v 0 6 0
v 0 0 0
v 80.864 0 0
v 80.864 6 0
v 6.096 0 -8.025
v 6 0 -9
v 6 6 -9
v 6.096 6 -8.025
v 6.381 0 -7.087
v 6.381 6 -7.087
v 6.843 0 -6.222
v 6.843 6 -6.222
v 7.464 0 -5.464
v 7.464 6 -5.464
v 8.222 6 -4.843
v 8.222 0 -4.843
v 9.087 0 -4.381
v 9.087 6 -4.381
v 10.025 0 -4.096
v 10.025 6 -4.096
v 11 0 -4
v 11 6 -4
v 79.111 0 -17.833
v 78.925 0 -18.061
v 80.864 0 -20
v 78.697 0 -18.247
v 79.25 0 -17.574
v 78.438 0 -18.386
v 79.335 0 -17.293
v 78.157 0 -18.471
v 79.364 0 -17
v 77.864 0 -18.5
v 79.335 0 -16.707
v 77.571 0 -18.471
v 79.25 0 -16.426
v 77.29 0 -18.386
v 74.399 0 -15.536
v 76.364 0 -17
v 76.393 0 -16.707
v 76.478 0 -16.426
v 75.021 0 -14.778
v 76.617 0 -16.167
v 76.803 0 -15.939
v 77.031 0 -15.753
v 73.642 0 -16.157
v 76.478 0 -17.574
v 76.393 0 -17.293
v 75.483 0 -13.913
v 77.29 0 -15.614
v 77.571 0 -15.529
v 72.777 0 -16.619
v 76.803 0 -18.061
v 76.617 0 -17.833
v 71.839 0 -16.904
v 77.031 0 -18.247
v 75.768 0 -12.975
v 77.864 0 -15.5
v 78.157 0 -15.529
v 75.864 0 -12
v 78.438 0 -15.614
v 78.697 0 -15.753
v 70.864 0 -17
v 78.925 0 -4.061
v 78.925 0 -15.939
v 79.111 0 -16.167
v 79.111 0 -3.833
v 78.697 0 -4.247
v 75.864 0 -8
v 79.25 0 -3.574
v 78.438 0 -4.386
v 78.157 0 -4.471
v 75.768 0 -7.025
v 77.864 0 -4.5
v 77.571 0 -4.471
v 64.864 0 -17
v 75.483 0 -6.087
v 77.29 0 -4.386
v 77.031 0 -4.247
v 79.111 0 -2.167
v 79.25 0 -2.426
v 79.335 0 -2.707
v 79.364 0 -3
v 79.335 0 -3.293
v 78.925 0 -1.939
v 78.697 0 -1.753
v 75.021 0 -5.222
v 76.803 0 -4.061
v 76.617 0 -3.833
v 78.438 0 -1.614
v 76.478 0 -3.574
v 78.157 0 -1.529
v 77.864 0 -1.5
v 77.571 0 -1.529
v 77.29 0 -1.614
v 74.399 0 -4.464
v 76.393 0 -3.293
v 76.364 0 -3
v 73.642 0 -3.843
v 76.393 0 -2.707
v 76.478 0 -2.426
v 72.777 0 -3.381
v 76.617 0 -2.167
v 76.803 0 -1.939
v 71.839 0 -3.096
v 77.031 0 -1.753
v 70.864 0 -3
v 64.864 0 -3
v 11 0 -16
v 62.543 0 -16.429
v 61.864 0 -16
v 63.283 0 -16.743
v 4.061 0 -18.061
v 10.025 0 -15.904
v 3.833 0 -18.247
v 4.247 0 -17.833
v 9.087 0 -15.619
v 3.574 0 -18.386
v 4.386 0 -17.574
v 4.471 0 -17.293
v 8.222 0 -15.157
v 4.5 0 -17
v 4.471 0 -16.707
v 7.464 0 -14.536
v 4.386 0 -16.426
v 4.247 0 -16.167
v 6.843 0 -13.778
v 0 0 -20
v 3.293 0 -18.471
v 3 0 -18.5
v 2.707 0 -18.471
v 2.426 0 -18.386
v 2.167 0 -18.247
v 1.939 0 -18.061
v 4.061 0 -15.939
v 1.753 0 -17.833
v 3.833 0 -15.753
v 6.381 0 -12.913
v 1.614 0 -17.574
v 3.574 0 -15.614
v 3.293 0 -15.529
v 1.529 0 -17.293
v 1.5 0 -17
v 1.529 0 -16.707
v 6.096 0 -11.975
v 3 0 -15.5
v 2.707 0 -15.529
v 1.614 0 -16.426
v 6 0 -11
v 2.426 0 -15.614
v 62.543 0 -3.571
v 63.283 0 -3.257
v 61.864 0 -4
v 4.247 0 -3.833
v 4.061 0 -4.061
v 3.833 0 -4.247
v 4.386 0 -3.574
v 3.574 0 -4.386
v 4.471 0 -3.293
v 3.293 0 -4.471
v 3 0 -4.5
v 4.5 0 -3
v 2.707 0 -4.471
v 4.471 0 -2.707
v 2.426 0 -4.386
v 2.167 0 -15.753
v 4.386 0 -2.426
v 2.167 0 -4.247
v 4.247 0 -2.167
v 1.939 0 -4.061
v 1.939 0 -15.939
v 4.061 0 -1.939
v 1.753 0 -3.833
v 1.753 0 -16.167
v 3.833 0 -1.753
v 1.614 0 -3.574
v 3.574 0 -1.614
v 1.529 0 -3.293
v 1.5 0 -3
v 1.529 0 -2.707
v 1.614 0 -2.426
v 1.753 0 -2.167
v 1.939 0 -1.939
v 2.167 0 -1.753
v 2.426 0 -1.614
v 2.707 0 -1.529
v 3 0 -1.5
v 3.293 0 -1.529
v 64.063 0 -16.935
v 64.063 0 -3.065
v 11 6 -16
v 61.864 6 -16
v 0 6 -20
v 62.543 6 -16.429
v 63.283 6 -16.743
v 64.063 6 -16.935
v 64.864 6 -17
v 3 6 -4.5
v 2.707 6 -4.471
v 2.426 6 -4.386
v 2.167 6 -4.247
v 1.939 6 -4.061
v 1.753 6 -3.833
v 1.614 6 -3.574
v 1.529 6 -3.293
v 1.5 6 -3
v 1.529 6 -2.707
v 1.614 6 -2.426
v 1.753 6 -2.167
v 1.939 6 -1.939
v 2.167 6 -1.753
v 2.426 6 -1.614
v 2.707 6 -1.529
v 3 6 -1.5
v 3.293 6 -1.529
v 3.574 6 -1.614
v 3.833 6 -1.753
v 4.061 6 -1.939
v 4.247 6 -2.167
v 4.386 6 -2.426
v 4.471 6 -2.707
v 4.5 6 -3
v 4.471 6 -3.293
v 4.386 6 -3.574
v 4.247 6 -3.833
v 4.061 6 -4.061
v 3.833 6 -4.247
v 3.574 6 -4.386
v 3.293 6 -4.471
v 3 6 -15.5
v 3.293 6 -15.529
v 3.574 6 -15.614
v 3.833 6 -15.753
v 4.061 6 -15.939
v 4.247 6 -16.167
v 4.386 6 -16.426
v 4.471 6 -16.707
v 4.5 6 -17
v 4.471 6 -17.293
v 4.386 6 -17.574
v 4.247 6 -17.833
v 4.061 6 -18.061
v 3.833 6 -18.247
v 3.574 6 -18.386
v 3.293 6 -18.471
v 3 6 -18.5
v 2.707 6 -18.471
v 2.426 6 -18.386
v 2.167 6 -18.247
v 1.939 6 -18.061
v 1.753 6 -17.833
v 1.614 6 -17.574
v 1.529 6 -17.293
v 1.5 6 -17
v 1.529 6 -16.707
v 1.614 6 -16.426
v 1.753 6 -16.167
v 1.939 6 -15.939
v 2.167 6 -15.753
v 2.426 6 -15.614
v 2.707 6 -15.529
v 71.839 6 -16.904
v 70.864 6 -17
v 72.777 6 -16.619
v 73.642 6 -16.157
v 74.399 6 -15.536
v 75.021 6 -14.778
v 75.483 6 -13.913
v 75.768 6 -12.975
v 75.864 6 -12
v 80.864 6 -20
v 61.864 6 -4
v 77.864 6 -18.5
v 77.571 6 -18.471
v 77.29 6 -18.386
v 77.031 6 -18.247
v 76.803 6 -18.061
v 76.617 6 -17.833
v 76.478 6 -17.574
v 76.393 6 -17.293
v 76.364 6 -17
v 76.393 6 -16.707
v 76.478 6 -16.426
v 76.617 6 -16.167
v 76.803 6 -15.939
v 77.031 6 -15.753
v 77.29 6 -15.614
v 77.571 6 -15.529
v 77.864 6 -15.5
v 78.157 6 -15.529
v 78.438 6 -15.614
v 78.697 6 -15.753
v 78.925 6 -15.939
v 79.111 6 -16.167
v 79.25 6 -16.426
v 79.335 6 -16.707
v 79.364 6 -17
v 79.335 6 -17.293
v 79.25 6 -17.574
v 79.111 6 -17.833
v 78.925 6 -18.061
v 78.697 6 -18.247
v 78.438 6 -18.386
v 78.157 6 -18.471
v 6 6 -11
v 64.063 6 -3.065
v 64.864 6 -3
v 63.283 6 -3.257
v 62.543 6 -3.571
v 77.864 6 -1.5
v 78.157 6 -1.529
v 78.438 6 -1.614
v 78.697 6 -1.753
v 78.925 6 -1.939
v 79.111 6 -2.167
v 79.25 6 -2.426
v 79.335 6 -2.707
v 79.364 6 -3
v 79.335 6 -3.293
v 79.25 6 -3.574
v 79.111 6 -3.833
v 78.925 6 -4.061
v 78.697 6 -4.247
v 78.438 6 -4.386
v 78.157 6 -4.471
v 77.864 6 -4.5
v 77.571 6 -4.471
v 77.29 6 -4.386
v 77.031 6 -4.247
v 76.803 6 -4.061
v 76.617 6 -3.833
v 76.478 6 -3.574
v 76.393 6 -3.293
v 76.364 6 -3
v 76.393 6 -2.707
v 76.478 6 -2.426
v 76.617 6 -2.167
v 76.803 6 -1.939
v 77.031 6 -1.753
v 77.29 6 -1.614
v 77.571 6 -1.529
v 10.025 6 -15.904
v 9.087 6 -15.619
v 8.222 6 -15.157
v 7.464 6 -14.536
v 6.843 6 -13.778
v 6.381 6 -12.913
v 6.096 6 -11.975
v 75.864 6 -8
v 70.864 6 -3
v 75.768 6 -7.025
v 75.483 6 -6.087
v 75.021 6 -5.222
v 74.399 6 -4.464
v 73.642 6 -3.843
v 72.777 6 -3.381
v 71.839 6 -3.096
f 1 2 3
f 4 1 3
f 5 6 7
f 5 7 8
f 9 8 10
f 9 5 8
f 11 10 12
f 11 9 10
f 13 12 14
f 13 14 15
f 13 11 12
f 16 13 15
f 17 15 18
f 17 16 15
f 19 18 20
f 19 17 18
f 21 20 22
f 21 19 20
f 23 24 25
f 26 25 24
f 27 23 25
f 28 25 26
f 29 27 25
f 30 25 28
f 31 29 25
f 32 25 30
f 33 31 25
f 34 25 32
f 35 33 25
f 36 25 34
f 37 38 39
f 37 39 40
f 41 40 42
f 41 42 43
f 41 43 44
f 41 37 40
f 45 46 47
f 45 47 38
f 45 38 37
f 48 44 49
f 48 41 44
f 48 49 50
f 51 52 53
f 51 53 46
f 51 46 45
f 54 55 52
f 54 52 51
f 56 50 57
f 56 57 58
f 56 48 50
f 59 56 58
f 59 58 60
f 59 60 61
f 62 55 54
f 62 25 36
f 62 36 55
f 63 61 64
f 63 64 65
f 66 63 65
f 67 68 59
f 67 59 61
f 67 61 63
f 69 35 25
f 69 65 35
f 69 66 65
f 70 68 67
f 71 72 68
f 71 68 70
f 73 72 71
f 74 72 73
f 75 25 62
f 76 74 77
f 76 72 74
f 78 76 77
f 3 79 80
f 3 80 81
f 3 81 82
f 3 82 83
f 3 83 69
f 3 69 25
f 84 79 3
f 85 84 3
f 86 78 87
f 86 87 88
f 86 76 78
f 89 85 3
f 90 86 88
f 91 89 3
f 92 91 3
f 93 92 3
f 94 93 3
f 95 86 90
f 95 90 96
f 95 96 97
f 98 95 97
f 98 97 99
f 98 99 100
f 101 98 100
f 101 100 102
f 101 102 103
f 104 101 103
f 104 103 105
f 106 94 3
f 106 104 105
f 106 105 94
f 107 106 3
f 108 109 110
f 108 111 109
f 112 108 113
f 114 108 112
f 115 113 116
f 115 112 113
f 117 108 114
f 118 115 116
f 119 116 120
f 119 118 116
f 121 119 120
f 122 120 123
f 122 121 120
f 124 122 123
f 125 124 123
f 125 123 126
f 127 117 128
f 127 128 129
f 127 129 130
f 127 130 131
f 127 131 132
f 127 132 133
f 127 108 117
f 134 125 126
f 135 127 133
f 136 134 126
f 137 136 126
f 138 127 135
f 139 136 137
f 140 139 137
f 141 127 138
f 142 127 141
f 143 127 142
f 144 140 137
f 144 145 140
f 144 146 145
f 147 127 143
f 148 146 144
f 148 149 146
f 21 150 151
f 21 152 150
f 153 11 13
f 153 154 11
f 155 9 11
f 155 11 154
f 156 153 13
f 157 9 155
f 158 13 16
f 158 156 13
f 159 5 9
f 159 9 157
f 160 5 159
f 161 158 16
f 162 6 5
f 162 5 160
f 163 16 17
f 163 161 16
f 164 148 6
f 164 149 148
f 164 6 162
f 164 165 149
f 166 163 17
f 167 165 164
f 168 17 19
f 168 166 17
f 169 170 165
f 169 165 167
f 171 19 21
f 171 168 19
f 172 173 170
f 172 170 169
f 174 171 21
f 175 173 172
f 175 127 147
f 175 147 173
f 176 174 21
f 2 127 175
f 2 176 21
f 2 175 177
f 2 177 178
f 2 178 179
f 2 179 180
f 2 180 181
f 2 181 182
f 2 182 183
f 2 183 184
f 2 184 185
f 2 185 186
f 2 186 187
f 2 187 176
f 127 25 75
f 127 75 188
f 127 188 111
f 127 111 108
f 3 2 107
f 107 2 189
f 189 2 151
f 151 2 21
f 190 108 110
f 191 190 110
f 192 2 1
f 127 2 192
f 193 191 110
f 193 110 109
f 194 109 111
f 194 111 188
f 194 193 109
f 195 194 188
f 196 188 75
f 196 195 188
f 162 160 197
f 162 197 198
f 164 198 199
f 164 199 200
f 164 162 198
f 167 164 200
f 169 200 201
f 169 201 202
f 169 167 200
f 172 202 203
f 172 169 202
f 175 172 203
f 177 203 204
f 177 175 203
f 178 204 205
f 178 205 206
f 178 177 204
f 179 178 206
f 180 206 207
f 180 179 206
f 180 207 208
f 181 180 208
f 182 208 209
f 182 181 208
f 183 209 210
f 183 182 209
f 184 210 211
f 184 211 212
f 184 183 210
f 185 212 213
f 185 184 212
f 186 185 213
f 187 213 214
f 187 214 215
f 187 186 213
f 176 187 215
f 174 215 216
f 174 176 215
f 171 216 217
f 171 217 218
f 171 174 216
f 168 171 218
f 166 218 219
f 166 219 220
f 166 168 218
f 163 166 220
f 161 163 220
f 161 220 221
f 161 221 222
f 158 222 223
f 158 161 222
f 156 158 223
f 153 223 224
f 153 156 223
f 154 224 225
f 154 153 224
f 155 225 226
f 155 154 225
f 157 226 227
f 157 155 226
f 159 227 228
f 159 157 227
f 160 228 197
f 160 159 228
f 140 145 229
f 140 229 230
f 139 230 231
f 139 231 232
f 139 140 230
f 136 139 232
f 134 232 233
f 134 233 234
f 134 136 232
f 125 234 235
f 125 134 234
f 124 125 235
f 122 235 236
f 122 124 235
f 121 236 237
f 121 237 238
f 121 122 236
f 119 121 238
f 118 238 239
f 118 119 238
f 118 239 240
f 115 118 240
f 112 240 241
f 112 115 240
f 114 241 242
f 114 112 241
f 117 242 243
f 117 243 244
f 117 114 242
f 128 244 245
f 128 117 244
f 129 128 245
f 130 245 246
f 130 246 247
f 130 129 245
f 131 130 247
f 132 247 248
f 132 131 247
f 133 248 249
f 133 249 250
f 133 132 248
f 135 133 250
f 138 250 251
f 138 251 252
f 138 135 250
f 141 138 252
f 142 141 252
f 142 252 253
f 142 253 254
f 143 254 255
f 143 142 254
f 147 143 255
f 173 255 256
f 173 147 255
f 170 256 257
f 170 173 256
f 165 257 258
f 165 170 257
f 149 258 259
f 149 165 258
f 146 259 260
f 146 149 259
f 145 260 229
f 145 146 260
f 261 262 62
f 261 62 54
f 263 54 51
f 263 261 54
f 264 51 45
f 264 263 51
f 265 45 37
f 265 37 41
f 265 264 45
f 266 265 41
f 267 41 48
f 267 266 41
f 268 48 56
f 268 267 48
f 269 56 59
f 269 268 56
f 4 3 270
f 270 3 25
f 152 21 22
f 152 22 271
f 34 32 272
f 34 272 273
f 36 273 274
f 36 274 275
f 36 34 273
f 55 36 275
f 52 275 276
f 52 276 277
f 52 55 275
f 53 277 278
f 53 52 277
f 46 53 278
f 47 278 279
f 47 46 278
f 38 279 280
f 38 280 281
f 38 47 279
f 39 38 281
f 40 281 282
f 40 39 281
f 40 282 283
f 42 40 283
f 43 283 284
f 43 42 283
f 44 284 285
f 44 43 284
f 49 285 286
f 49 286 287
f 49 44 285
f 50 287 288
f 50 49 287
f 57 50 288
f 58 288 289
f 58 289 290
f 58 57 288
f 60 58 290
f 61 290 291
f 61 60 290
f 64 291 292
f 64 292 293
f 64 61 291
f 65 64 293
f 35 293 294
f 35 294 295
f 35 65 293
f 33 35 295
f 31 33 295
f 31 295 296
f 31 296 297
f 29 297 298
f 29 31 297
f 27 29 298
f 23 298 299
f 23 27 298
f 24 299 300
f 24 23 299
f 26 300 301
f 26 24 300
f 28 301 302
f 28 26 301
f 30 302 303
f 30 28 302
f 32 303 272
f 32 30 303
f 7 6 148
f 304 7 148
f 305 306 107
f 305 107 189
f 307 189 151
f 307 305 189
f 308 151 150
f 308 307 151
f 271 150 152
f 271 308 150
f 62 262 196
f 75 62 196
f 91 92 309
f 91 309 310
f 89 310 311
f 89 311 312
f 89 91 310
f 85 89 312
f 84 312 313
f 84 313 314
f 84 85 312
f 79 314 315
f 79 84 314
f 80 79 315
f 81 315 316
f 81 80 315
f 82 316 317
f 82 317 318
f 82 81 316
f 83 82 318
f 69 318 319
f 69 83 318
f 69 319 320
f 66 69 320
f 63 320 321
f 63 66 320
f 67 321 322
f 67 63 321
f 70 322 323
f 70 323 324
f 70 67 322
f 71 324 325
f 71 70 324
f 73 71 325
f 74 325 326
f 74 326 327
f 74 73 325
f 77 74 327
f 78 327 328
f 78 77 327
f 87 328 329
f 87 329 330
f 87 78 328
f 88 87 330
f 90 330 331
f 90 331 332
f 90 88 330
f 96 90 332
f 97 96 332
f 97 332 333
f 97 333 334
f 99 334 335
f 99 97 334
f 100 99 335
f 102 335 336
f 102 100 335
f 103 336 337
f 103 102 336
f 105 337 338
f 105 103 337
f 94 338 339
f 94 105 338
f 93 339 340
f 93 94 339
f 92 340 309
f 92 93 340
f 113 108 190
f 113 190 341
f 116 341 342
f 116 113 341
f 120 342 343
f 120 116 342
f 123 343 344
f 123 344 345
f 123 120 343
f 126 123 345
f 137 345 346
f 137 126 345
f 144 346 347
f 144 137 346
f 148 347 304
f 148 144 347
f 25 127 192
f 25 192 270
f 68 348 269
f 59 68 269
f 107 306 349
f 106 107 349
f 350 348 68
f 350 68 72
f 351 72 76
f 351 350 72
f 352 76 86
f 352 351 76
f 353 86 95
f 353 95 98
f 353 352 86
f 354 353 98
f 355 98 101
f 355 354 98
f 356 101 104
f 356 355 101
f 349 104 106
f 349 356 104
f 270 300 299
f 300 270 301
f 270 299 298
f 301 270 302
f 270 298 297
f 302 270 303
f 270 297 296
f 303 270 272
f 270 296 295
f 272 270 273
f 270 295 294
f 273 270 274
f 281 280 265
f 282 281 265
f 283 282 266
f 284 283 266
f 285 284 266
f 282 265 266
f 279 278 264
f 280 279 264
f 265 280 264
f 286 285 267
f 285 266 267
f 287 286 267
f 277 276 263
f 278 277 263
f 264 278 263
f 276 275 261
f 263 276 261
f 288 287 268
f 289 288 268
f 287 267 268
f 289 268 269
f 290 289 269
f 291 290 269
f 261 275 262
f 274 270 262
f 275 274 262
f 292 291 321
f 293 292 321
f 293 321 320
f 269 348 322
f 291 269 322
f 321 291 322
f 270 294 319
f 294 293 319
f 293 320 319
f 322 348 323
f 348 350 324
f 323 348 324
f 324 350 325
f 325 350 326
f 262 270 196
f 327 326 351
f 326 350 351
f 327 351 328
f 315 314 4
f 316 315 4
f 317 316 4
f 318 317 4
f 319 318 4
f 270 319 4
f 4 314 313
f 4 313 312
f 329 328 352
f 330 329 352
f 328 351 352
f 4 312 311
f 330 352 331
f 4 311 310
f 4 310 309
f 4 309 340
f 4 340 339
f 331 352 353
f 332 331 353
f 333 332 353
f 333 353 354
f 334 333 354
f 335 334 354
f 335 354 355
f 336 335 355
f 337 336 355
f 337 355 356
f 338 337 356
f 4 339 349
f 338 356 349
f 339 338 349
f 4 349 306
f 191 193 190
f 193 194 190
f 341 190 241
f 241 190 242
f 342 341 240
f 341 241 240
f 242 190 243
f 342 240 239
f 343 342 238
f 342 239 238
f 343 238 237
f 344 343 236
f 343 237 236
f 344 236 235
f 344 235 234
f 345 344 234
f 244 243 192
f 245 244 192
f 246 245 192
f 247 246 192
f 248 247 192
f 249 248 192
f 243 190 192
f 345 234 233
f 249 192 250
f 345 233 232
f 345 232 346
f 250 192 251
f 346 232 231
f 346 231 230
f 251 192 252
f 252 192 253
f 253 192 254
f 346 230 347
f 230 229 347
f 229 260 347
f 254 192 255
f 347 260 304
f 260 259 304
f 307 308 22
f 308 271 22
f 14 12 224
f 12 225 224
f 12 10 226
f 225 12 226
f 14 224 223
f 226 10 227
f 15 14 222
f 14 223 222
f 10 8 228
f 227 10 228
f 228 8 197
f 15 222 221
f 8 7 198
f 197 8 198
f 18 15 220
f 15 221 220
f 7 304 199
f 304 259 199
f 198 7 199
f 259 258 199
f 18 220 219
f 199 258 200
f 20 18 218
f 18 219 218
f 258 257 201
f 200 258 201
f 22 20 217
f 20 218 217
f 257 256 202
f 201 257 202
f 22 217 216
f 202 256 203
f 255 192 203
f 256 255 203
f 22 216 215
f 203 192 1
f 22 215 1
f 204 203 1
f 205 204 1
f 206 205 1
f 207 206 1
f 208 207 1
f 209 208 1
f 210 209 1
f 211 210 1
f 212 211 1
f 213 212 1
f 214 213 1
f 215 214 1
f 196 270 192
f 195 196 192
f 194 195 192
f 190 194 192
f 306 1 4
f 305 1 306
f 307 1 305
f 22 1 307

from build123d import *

# Parameters (mm, degrees)
SKETCH1_W           = 80.863890266
SKETCH1_H           = 20
SKETCH1_R           = 1.5
SKETCH1_W_2         = 68.863890266
SKETCH1_H_2         = 12
BOSS_EXTRUDE1_DEPTH = 6
CUT_EXTRUDE1_DEPTH  = 84.516278347
FILLET1_R           = 5


with BuildPart() as part:
    # Sketch1 → Boss-Extrude1 (new body)
    with BuildSketch(Plane(origin=(0, 0, 0), x_dir=(1, 0, 0), z_dir=(0, 1, 0))):
        with Locations((40.431945133, 10)):
            Rectangle(SKETCH1_W, SKETCH1_H)
        with Locations(Location((3, 17, 0), (0, 0, 270))):
            Circle(SKETCH1_R, mode=Mode.SUBTRACT)
        with Locations(Location((3, 3, 0), (0, 0, 90))):
            Circle(SKETCH1_R, mode=Mode.SUBTRACT)
        with Locations(Location((77.863890266, 3, 0), (0, 0, 270))):
            Circle(SKETCH1_R, mode=Mode.SUBTRACT)
        with Locations(Location((77.863890266, 17, 0), (0, 0, 90))):
            Circle(SKETCH1_R, mode=Mode.SUBTRACT)
        with Locations((40.431945133, 10)):
            Rectangle(SKETCH1_W_2, SKETCH1_H_2, mode=Mode.SUBTRACT)
    extrude(amount=BOSS_EXTRUDE1_DEPTH)

    # Sketch2 → Cut-Extrude1 (cut, through all)
    with BuildSketch(Plane(origin=(0, 6, 0), x_dir=(1, 0, 0), z_dir=(0, 1, 0))):
        Polygon((61.863890266, 17), (61.863890266, 16), (74.863890266, 16), (74.863890266, 4), (61.863890266, 4), (61.863890266, 3), (75.863890266, 3), (75.863890266, 17), align=None)
    extrude(amount=-CUT_EXTRUDE1_DEPTH, mode=Mode.SUBTRACT)

    # Fillet1
    # the kernel refuses this fillet: 5 mm, written as the material it adds along each edge
    with BuildSketch(Plane(origin=(75.863890266, 6, -17), x_dir=(0, 0, 1), z_dir=(0, -1, 0)), Plane(origin=(75.863890266, 6, -3), x_dir=(-1, 0, 0), z_dir=(0, -1, 0)), Plane(origin=(6, 0, -16), x_dir=(0, 0, 1), z_dir=(0, 1, 0))) as fillet1_piece_1:
        with BuildLine():
            CenterArc((FILLET1_R, FILLET1_R), FILLET1_R, 180, 90)
            Line((0, FILLET1_R), (-FILLET1_R * 0.02, FILLET1_R))
            Line((-FILLET1_R * 0.02, FILLET1_R), (-FILLET1_R * 0.02, -FILLET1_R * 0.02))
            Line((-FILLET1_R * 0.02, -FILLET1_R * 0.02), (FILLET1_R, -FILLET1_R * 0.02))
            Line((FILLET1_R, -FILLET1_R * 0.02), (FILLET1_R, 0))
        make_face()
    extrude(amount=6)
    with BuildSketch(Plane(origin=(61.863890266, 6, -17), x_dir=(1, 0, 0), z_dir=(0, -1, 0))) as fillet1_piece_2:
        with BuildLine():
            CenterArc((3, 5), FILLET1_R, 233.130102354, 36.869897646)
            Line((0, 1), (-0.06, 0.92))
            ThreePointArc((-0.06, 0.92), (-0.1, 0.5), (-0.1, 0))
            Line((-0.1, 0), (0, -0.1))
            Line((0, -0.1), (3, -0.1))
            Line((3, -0.1), (3, 0))
        make_face()
    extrude(amount=6)
    with BuildSketch(Plane(origin=(61.863890266, 6, -3), x_dir=(0, 0, -1), z_dir=(0, -1, 0))) as fillet1_piece_3:
        with BuildLine():
            CenterArc((5, 3), FILLET1_R, 180, 36.869897646)
            Line((0, 3), (-0.1, 3))
            Line((-0.1, 3), (-0.1, 0))
            Line((-0.1, 0), (0, -0.1))
            ThreePointArc((0, -0.1), (0.5, -0.1), (0.92, -0.06))
            Line((0.92, -0.06), (1, 0))
        make_face()
    extrude(amount=6)
    with BuildSketch(Plane(origin=(6, 0, -4), x_dir=(0, 0, -1), z_dir=(0, 1, 0))) as fillet1_piece_4:
        with BuildLine():
            CenterArc((FILLET1_R, -FILLET1_R), FILLET1_R, 90, 90)
            Line((0, -FILLET1_R), (-FILLET1_R * 0.02, -FILLET1_R))
            Line((-FILLET1_R * 0.02, -FILLET1_R), (-FILLET1_R * 0.02, FILLET1_R * 0.02))
            Line((-FILLET1_R * 0.02, FILLET1_R * 0.02), (FILLET1_R, FILLET1_R * 0.02))
            Line((FILLET1_R, FILLET1_R * 0.02), (FILLET1_R, 0))
        make_face()
    extrude(amount=6)


solid = part.part
